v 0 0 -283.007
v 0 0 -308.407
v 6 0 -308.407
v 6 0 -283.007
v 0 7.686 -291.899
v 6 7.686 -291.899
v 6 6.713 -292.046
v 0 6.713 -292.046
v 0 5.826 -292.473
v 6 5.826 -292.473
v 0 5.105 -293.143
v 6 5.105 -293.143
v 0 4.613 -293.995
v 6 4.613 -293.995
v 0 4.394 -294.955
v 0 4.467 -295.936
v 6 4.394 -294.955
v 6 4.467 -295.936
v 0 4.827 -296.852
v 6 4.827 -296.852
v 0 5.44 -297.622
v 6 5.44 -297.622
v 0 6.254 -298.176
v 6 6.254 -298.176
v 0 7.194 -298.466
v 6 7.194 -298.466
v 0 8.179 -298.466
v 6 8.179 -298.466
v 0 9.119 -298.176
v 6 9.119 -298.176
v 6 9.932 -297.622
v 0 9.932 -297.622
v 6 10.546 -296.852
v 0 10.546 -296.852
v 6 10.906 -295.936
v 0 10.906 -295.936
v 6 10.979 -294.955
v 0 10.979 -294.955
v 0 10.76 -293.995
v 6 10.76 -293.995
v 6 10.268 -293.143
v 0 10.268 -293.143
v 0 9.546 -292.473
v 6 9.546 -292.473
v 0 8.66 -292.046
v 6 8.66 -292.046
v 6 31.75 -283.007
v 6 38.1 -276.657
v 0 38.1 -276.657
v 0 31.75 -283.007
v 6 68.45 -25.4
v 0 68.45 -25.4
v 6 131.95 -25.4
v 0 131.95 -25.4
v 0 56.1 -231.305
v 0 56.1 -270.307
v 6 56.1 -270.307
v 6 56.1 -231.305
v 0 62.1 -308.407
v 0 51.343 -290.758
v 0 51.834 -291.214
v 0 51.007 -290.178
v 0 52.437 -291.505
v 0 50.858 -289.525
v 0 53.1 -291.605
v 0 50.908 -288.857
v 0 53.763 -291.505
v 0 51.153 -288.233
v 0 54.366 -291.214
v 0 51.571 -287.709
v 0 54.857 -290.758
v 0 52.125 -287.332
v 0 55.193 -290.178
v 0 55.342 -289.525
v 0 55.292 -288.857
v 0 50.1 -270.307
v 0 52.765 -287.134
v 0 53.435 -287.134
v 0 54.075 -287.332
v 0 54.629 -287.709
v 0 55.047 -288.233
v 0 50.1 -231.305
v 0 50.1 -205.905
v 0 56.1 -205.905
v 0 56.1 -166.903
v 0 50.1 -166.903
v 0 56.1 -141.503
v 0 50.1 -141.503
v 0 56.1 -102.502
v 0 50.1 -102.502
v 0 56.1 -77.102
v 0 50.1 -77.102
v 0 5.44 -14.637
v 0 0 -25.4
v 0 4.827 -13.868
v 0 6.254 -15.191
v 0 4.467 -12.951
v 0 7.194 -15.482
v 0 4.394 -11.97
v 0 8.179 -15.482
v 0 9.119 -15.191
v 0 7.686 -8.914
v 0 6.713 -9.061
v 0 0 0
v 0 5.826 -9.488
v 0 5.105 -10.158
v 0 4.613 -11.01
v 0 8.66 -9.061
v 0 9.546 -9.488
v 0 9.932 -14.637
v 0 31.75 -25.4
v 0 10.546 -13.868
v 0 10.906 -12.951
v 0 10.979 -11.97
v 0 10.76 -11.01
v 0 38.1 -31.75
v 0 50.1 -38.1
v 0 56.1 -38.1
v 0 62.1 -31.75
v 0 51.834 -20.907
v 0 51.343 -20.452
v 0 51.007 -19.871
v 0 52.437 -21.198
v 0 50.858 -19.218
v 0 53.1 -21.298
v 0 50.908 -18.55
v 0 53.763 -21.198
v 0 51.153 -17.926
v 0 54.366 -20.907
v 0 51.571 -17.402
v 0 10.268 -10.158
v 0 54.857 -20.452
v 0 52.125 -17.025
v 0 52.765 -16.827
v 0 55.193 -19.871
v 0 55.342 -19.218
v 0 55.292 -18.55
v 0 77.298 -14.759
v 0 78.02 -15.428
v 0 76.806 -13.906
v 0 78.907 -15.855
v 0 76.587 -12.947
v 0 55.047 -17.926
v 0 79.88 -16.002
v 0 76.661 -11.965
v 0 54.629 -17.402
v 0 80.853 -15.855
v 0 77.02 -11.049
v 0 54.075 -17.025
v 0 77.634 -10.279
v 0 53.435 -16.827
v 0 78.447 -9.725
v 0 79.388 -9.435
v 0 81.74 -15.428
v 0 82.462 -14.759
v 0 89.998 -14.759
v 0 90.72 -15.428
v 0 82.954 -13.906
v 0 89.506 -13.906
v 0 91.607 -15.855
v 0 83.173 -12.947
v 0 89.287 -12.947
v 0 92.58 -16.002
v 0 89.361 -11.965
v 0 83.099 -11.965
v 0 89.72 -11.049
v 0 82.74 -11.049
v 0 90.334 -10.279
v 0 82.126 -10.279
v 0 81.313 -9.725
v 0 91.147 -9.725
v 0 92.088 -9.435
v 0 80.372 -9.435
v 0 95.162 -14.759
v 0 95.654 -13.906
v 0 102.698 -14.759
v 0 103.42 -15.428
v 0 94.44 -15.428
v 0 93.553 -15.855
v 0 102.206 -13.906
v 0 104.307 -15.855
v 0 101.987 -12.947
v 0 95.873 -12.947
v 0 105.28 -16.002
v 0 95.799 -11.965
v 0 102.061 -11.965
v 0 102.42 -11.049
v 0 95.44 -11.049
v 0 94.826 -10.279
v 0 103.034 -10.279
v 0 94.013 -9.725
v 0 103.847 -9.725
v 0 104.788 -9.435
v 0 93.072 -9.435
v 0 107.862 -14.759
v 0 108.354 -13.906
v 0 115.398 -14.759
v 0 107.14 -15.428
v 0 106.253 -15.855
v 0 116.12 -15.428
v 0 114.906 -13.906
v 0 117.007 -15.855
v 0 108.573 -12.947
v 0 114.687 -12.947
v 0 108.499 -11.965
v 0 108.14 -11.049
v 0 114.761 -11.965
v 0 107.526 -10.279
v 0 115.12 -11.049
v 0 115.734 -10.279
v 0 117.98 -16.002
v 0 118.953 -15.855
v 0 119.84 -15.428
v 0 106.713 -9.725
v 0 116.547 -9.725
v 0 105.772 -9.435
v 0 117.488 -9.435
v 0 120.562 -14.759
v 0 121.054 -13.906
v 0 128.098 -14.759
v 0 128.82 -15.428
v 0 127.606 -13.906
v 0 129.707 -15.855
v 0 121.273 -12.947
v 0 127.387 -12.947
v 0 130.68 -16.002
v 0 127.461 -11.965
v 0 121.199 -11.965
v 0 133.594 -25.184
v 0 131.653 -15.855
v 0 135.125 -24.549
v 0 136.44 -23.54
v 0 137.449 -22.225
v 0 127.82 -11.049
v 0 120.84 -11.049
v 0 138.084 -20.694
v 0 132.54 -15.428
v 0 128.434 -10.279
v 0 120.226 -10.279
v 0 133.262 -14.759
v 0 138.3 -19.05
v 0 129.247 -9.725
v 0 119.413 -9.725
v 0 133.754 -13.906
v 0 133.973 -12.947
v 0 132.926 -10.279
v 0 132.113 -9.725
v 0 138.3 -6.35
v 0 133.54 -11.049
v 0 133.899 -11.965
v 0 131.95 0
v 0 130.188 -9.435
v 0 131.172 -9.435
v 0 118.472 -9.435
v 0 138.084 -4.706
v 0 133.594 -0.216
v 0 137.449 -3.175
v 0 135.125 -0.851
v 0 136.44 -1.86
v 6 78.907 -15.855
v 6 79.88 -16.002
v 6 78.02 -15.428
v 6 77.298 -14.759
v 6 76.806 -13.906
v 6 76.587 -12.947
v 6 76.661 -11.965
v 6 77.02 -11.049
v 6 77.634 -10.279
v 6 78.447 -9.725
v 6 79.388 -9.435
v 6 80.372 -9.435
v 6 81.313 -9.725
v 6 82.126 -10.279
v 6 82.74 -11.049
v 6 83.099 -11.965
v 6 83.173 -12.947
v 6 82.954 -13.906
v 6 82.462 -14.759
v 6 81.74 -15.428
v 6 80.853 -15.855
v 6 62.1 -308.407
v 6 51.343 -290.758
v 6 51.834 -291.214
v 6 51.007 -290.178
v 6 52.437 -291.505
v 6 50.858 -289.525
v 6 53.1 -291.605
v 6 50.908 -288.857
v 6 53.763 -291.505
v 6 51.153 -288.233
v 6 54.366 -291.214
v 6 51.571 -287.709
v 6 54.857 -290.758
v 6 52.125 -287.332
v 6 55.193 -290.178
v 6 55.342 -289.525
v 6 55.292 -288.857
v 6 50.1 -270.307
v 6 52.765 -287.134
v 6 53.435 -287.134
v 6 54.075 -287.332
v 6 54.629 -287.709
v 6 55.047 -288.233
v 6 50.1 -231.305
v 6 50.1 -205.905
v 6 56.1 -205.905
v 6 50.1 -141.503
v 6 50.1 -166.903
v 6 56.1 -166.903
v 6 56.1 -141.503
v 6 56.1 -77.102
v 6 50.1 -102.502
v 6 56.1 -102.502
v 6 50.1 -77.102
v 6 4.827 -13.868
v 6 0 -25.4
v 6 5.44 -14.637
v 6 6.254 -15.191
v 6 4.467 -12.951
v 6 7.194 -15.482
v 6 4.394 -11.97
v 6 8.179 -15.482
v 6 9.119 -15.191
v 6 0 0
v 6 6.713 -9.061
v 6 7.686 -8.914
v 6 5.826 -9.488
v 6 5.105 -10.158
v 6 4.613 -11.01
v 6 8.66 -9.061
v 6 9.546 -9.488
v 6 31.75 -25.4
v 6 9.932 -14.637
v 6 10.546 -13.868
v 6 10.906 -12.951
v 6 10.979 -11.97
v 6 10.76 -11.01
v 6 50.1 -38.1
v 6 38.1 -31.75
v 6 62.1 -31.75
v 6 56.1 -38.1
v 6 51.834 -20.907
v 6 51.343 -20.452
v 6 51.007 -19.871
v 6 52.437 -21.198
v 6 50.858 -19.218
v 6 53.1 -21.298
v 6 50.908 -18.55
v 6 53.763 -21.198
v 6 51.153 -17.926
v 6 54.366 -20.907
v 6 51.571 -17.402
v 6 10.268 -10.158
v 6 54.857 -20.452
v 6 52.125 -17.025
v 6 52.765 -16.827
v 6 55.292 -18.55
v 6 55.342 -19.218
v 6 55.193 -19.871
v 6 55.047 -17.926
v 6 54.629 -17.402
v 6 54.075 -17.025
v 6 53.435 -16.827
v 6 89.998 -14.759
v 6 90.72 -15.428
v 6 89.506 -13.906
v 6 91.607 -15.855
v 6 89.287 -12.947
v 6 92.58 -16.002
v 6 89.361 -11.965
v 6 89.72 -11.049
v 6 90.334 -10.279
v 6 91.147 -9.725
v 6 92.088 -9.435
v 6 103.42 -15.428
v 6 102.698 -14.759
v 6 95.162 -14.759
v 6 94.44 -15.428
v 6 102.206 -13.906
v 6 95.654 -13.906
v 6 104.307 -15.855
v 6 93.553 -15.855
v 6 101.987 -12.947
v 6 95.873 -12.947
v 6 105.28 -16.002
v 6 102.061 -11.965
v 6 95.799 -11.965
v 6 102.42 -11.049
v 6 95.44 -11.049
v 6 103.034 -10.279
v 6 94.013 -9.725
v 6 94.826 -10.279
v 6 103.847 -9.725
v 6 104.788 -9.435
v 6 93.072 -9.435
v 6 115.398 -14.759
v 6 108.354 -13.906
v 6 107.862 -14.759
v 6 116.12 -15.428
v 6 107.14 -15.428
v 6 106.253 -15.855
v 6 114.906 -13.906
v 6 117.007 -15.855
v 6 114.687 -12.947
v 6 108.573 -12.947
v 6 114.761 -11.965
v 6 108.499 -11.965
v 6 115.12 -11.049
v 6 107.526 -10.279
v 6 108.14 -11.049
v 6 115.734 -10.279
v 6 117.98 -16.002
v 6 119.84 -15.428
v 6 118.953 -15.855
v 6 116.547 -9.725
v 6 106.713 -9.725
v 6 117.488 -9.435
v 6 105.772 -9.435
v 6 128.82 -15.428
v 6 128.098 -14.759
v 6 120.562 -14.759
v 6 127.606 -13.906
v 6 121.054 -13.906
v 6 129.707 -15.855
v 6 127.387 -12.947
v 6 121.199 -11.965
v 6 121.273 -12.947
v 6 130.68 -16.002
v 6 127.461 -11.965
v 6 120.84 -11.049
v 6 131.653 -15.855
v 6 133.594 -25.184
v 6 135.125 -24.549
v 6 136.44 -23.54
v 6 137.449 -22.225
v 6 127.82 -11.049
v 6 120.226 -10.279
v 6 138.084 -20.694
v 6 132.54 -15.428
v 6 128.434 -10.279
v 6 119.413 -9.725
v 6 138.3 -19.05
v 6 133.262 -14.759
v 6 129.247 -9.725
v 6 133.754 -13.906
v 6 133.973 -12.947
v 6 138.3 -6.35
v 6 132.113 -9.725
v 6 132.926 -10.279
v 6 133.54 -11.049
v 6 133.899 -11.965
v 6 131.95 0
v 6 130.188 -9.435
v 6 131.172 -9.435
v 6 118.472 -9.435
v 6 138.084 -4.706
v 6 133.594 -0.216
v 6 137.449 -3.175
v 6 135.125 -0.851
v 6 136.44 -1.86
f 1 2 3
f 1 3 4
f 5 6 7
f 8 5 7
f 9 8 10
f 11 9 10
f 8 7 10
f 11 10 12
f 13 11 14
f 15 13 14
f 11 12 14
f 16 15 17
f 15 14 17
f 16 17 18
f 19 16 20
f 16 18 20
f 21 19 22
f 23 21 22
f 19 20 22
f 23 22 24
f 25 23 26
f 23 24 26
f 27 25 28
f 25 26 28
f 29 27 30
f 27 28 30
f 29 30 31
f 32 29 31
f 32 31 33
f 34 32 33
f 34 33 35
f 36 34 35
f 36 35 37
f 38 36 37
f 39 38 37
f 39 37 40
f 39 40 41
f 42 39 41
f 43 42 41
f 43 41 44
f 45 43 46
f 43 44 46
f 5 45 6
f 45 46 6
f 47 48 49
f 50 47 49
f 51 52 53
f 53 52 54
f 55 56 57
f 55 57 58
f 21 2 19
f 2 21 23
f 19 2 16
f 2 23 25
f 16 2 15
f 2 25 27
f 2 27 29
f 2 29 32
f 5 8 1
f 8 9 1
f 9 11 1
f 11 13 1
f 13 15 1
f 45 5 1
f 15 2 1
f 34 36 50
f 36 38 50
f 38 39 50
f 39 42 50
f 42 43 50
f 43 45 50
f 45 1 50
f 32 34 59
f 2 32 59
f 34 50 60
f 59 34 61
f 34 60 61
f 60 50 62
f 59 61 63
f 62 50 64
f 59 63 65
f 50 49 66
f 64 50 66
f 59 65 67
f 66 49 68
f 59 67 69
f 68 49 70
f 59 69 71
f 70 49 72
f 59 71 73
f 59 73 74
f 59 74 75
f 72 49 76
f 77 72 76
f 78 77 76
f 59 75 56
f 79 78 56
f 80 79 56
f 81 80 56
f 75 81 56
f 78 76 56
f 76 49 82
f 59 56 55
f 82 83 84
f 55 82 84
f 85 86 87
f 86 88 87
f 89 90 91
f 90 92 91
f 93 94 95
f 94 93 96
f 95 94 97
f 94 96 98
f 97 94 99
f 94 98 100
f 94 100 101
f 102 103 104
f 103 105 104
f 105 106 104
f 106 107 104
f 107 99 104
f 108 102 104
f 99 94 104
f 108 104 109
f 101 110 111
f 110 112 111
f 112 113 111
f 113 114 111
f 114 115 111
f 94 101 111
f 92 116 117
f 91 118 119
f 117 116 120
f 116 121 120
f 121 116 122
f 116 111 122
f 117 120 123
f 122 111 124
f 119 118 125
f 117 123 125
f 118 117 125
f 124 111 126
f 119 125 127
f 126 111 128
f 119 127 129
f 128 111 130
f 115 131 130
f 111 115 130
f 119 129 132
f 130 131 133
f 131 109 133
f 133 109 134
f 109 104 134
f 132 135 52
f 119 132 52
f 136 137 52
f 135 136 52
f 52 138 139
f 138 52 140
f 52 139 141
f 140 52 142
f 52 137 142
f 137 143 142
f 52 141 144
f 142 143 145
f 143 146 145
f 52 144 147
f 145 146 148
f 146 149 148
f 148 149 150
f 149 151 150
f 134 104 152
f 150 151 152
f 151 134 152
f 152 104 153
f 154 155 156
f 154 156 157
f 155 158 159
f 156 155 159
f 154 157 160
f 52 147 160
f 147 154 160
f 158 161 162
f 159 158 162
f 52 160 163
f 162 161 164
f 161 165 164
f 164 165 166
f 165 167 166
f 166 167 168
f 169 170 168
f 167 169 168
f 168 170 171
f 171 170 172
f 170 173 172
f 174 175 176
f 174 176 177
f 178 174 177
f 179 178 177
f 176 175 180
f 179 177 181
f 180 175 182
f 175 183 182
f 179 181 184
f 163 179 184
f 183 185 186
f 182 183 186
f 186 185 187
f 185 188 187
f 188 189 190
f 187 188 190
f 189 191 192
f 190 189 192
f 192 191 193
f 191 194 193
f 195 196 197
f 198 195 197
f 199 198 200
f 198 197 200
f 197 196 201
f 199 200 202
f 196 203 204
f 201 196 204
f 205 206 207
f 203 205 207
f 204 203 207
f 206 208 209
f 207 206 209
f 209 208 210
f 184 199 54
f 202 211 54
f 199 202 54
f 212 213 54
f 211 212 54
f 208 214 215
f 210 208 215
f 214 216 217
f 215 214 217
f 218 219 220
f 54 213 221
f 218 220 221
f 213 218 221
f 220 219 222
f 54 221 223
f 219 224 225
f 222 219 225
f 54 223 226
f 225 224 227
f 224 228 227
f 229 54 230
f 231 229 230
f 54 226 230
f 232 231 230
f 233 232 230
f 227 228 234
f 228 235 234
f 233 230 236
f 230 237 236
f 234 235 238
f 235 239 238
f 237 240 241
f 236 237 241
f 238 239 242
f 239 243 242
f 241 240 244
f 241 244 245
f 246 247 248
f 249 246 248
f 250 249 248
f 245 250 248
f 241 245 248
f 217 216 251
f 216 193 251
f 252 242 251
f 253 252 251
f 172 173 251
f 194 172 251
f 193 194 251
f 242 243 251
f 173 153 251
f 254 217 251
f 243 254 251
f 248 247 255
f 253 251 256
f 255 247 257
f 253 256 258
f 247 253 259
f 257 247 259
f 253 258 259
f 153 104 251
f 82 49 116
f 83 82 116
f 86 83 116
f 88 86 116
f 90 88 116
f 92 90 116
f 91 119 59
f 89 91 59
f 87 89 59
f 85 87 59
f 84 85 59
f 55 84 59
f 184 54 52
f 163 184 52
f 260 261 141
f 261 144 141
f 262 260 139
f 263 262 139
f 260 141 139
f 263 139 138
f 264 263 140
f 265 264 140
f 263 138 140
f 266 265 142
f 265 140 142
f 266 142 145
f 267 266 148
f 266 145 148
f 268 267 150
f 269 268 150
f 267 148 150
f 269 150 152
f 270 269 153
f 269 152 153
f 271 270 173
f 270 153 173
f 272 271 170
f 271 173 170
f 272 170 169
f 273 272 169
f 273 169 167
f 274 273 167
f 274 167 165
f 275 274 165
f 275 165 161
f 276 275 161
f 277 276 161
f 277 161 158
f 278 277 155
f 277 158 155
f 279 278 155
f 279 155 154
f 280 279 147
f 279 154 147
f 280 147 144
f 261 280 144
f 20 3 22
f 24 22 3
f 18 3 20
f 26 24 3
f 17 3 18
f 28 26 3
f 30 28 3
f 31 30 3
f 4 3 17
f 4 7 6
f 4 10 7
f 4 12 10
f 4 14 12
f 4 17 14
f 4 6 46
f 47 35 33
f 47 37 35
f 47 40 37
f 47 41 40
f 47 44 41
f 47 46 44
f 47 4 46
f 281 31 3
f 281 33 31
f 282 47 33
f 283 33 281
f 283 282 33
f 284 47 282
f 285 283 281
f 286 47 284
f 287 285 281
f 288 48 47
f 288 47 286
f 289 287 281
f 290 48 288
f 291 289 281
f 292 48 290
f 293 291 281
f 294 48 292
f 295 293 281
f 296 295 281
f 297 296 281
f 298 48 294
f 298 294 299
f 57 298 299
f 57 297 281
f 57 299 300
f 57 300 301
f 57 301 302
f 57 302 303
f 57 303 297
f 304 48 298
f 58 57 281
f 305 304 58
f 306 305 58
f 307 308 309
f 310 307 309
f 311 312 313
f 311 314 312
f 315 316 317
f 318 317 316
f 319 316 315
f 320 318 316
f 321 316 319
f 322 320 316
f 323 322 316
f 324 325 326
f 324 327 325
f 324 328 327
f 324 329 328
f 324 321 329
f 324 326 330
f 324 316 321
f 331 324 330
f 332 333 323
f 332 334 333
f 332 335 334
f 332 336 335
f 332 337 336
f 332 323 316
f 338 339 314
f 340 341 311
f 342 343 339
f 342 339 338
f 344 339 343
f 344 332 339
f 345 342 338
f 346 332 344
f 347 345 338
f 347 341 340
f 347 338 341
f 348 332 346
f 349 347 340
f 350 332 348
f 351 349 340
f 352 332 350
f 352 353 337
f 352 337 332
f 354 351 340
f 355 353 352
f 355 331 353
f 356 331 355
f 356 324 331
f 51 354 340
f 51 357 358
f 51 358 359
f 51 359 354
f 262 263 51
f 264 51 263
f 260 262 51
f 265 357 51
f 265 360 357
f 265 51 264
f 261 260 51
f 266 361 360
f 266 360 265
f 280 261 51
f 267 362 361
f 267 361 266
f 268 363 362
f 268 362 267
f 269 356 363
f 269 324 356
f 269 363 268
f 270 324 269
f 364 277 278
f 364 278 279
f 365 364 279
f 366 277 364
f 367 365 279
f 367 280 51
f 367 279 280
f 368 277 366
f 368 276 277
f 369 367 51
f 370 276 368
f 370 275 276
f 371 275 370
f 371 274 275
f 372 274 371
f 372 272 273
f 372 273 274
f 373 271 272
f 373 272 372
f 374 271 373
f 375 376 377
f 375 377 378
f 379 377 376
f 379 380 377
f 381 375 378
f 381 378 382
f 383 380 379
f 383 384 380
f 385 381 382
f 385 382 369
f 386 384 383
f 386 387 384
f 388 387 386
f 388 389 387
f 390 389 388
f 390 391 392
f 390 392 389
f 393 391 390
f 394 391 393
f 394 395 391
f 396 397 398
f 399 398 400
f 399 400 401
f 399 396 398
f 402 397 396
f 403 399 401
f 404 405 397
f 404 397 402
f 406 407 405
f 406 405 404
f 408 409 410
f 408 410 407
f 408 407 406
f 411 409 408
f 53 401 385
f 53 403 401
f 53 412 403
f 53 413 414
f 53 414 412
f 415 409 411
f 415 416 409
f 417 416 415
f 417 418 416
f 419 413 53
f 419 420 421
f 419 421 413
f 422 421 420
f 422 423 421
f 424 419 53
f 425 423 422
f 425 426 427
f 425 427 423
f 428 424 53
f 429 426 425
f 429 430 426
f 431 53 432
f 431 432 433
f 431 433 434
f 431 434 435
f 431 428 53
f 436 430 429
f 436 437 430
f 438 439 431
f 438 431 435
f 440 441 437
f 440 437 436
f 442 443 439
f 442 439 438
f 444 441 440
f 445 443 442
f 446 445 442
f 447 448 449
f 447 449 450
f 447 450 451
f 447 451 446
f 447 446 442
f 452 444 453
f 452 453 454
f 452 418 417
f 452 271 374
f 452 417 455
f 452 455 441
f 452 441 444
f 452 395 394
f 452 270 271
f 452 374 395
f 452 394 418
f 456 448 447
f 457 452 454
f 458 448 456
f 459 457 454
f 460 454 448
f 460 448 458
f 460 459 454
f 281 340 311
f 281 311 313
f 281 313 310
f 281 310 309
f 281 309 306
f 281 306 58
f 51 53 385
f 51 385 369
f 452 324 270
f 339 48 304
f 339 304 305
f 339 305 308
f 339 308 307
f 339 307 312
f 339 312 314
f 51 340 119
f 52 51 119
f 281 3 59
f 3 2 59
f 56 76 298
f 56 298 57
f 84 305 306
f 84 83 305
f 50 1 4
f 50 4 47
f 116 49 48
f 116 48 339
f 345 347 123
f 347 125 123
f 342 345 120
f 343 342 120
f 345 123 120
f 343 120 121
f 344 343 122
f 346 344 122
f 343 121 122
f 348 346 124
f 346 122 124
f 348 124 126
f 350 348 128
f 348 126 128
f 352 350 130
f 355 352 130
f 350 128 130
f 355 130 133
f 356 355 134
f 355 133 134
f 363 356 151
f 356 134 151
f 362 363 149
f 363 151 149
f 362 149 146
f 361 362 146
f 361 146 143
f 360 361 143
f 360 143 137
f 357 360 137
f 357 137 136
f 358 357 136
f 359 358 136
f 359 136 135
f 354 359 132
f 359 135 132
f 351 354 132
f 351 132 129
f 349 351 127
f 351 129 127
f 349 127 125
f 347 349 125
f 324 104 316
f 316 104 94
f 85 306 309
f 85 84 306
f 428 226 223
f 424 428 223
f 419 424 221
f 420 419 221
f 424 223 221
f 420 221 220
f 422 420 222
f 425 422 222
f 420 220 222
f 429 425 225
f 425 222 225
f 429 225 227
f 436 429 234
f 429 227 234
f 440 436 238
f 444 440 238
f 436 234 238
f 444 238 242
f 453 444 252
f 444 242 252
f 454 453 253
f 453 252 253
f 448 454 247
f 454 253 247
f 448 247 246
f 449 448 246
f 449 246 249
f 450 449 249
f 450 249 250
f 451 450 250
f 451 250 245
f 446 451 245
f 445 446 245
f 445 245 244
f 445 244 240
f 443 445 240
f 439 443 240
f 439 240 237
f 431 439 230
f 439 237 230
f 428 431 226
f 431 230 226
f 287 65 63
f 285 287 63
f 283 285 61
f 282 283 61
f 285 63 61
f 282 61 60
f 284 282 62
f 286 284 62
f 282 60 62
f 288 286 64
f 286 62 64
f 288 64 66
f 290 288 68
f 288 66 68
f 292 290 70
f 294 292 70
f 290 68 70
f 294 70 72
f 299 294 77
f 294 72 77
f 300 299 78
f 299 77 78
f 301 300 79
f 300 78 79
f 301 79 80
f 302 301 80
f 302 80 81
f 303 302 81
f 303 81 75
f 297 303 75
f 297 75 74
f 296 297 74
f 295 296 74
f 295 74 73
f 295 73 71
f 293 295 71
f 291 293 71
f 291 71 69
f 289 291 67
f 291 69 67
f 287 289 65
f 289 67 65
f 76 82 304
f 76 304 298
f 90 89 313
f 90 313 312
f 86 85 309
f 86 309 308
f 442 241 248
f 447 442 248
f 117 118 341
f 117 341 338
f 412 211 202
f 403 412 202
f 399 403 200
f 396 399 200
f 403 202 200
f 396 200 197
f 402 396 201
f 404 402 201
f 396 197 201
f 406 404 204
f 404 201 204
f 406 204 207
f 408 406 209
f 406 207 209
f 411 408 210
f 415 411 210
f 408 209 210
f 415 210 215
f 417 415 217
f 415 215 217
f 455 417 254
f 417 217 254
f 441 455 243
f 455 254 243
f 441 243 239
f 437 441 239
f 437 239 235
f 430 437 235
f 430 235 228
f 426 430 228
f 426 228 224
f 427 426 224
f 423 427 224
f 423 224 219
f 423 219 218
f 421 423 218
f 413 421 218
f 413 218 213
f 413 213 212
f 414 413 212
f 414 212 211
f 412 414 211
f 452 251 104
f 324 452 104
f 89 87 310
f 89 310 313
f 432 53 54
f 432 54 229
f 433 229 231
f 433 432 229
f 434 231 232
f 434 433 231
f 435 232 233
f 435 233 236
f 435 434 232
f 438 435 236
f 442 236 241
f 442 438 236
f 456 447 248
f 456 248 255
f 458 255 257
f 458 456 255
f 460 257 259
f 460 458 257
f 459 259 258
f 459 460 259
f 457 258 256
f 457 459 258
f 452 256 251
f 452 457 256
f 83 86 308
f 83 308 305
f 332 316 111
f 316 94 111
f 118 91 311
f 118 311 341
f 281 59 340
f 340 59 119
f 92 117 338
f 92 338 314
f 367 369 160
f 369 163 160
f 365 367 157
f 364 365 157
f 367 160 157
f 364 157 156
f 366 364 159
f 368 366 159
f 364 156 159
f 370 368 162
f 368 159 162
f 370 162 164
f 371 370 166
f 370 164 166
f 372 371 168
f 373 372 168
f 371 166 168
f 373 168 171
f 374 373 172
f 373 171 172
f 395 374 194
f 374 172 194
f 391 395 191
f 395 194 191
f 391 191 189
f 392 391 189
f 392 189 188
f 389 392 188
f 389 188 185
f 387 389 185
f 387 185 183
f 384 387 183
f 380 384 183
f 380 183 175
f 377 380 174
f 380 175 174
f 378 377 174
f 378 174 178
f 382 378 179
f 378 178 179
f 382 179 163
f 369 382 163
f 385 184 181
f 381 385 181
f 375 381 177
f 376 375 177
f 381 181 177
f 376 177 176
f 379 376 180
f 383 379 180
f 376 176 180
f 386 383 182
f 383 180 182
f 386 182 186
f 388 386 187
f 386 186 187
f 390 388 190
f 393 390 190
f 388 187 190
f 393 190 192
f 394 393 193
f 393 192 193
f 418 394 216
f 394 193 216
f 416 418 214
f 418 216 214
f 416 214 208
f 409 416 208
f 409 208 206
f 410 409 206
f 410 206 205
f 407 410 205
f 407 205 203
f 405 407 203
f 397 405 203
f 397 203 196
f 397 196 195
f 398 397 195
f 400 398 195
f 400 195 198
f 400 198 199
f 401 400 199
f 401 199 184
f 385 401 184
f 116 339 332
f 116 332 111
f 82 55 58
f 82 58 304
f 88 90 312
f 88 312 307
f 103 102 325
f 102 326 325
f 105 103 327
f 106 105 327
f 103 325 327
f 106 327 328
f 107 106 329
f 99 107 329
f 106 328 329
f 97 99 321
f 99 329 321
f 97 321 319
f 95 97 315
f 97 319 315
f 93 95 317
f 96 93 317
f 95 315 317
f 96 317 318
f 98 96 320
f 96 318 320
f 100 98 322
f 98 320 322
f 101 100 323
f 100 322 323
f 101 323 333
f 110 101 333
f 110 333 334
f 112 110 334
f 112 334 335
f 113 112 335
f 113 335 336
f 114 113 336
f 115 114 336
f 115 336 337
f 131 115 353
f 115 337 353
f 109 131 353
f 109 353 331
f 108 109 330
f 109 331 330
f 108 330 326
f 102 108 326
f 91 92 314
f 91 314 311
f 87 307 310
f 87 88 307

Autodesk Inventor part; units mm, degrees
ref_plane "YZ Plane" through (0, 0, 0) normal (1, 0, 0) x (0, 1, 0)
ref_plane "XZ Plane" through (0, 0, 0) normal (0, 1, 0) x (-1, 0, 0)
ref_plane "XY Plane" through (0, 0, 0) normal (0, 0, 1) x (1, 0, 0)
sketch "Sketch1" plane through (0, 0, 0) normal (1, 0, 0) x (0, 1, 0)
  line L0 (0, 0) -> (0, -38.1)
  line L1 (0, -38.1) -> (38.1, -38.1)
  line L2 (0, -308.4068) -> (0, -270.3068)
  line L3 (0, -270.3068) -> (38.1, -270.3068)
  line L4 (0, -308.4068) -> (62.1, -308.4068)
  line L5 (62.1, -308.4068) -> (62.1, -25.4)
  line L6 (62.1, -25.4) -> (138.3, -25.4)
  line L7 (138.3, -25.4) -> (138.3, 0)
  line L8 (38.1, -38.1) -> (38.1, -270.3068)
  line L9 (138.3, 0) -> (0, 0)
  line L10 (56.1, -38.1) -> (50.1, -38.1)
  line L11 (50.1, -38.1) -> (50.1, -77.1017)
  line L12 (50.1, -77.1017) -> (56.1, -77.1017)
  line L13 (56.1, -77.1017) -> (56.1, -38.1)
  line L14 (56.1, -102.5017) -> (50.1, -102.5017)
  line L15 (50.1, -102.5017) -> (50.1, -141.5034)
  line L16 (50.1, -141.5034) -> (56.1, -141.5034)
  line L17 (56.1, -141.5034) -> (56.1, -102.5017)
  line L18 (56.1, -166.9034) -> (50.1, -166.9034)
  line L19 (50.1, -166.9034) -> (50.1, -205.9051)
  line L20 (50.1, -205.9051) -> (56.1, -205.9051)
  line L21 (56.1, -205.9051) -> (56.1, -166.9034)
  line L22 (56.1, -231.3051) -> (50.1, -231.3051)
  line L23 (50.1, -231.3051) -> (50.1, -270.3068)
  line L24 (50.1, -270.3068) -> (56.1, -270.3068)
  line L25 (56.1, -270.3068) -> (56.1, -231.3051)
  point P0 (0, -289.3568)
  point P1 (56.1, -57.6008)
  point P2 (56.1, -122.0026)
  point P3 (56.1, -186.4043)
  point P4 (56.1, -250.806)
  dimension "d1" = 38.1
  dimension "d2" = 38.1
  dimension "d4" = 38.1
  dimension "d5" = 24
  dimension "d6" = 76.2
  dimension "d16" = 308.4068
  dimension "d17" = 6
  dimension "d18" = 39.0017
  dimension "d21" = 6
  dimension "d22" = 39.0017
  dimension "d23" = 25.4
  dimension "d24" = 6
  dimension "d25" = 39.0017
  dimension "d26" = 25.4
  dimension "d27" = 6
  dimension "d28" = 39.0017
  dimension "d29" = 25.4
  dimension "d49" = 25.4
  dimension "d61" = 38.1
  dimension "d62" = 50.1
extrude "Extrusion1" add sketch "Sketch1" along normal blind 6
sketch "Sketch2" plane through (0, 0, 0) normal (-1, 0, 0) x (0, 0, 1)
  circle A0 centre (-12.2165, 7.6864) radius 3.175 projected
  circle A1 centre (-295.2013, 7.6864) radius 3.175 projected
  point P0 (0, 0)
sketch "Sketch3" plane through (0, 0, 0) normal (-1, 0, 0) x (0, 0, 1)
  line L0 (0, 0) -> (-38.1, 0) projected
  line L1 (-38.1, 0) -> (-25.4, 0)
  line L2 (-25.4, 0) -> (-25.4, 38.1)
  line L3 (-25.4, 38.1) -> (-38.1, 38.1)
  line L4 (-38.1, 38.1) -> (-38.1, 0)
  line L5 (-270.3068, 38.1) -> (-270.3068, 0) projected
  line L6 (-270.3068, 0) -> (-283.0068, 0)
  line L7 (-283.0068, 0) -> (-283.0068, 38.1)
  line L8 (-283.0068, 38.1) -> (-270.3068, 38.1)
  line L9 (-270.3068, 38.1) -> (-270.3068, 0)
  dimension "d37" = 12.7
  dimension "d90" = 38.1
extrude "Extrusion3" cut sketch "Sketch3" against normal through all
chamfer "Chamfer1" distance 6.35 angle 45 2 edges at (3, 38.1, -283.0068) (3, 38.1, -25.4)
chamfer "Chamfer2" distance 6.35 angle 45 1 edges at (3, 62.1, -25.4)
fillet "Fillet1" radius 6.35 2 edges at (3, 138.3, -25.4) (3, 138.3, 0)
sketch "Sketch4" plane through (6, 0, 0) normal (1, 0, 0) x (0, 0, -1)
  circle A0 centre (12.7, 130.68) radius 3.175
  line L0 (19.05, 138.3) -> (6.35, 138.3) projected
  line L1 (25.4, 68.45) -> (25.4, 131.95) projected
  circle A1 centre (12.7, 117.98) radius 3.175
  circle A2 centre (12.7, 105.28) radius 3.175
  circle A3 centre (12.7, 92.58) radius 3.175
  circle A4 centre (12.7, 79.88) radius 3.175
  point P0 (0, 0)
  point P1 (12.7, 138.3)
  dimension "d50" = 6.35
  dimension "d51" = 7.62
  dimension "d54" = 12.7
sketch "Sketch5" plane through (6, 0, 0) normal (1, 0, 0) x (0, 0, -1)
  circle A0 centre (19.05, 53.1) radius 1.6256
  circle A1 centre (289.3568, 53.1) radius 1.6256
  line L0 (0, 131.95) -> (0, 0) projected
  line L1 (308.4068, 0) -> (308.4068, 62.1) projected
  line L2 (270.3068, 56.1) -> (270.3068, 50.1) projected
  line L3 (38.1, 50.1) -> (38.1, 56.1) projected
  point P0 (270.3068, 53.1)
  point P1 (38.1, 53.1)
  dimension "d63" = 3.2512
  dimension "d64" = 3.2512
  dimension "d65" = 19.05
  dimension "d66" = 19.05
hole "Hole1" at (0, 7.6864, -12.2165) at (0, 7.6864, -295.2013) direction (1, 0, 0) diameter 6.604 depth 17.0942 tip angle 118 clearance for "Hex Head Bolt" size "M6" standard "Ansi Metric M Profile"
hole "Hole2" at (6, 79.88, -12.7) at (6, 92.58, -12.7) at (6, 105.28, -12.7) at (6, 117.98, -12.7) at (6, 130.68, -12.7) direction (-1, 0, 0) diameter 6.604 depth 17.0942 tip angle 118 clearance for "Hex Head Bolt" size "M6" standard "Ansi Metric M Profile"
hole "Hole3" at (6, 53.1, -289.3568) at (6, 53.1, -19.05) direction (-1, 0, 0) diameter 4.4958 depth 17.0942 tip angle 118 clearance for "Socket Head Cap Screw" size "M4" standard "Ansi Metric M Profile"
properties part number "V3 Mounting Wall"
